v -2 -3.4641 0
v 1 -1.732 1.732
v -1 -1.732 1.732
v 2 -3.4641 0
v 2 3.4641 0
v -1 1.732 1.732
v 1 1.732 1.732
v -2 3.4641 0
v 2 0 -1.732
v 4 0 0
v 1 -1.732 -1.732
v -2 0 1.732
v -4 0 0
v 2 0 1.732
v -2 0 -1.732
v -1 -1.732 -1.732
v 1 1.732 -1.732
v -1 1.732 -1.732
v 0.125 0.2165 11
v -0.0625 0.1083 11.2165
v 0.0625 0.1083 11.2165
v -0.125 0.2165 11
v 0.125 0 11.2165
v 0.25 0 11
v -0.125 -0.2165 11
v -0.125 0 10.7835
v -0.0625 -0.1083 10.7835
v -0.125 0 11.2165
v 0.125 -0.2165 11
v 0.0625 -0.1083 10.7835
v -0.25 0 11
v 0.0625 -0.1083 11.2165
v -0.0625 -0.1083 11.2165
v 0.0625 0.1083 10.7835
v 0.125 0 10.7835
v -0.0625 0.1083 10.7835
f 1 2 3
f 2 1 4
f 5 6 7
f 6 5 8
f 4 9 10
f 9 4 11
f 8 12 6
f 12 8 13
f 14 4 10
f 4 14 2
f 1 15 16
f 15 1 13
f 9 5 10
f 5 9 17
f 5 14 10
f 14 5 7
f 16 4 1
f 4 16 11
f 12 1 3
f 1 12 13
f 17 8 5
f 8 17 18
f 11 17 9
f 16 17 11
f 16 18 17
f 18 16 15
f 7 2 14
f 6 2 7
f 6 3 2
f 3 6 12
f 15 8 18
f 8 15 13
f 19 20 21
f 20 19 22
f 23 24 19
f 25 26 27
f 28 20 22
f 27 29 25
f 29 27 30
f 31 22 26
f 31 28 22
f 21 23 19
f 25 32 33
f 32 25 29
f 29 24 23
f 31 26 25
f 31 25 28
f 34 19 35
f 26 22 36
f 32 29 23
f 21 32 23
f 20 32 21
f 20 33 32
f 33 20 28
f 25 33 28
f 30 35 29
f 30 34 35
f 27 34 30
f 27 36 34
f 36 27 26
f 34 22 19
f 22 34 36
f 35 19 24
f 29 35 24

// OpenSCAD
mirror([1,0,0]) scale([2,2,2]) stamp_base(base_thick = 1.5);
mirror([1,0,0]) scale([2,2,2]) stamp_text(base_thick = 3);
mirror([1,0,0]) scale([2,2,2]) stamp_border(base_thick = 3);
mirror([1,0,0]) scale([2,2,2]) stamp_bulb(base_thick = 3);
!mirror([1,0,0]) scale([2,2,2]) stamp_all(base_thick = 3);

//DXFs for lasercutting
projection() mirror([1,0,0]) scale([2,2,2]) stamp_base(base_thick = 1.5);
projection(cut=true) mirror([1,0,0]) scale([2,2,2]) translate([0,0,-8]) stamp_all(base_thick = 3);

scale([1.5,1.5,1]) logo();

sc = .1;

stamp_base_thick = 6;
base_thick = 1.5;
gear_thick = 2;
thread_thick = 2.5;
inner_thick = 2;

module stamp_base(){
    sphere_rad = 1;
    minkowski(){
        translate([0,0,stamp_base_thick-base_thick+sphere_rad/2-.25]) hull() linear_extrude(height=base_thick-sphere_rad){
            scale([sc,sc,sc]) import("nova-labs-stamp.dxf", layer="border");
            scale([sc,sc,sc]) import("nova-labs-stamp.dxf", layer="bulb");
        }
        
        //cylinder(r1=1, r2=.5, h=base_thick/2, $fn=12);
        scale([2,2,1]) sphere(r=sphere_rad/2, $fn=6);
    }
    
    hull() {
        minkowski(){
            translate([0,0,stamp_base_thick-base_thick+sphere_rad/2-.25]) hull() linear_extrude(height=base_thick-sphere_rad){
                scale([sc,sc,sc]) import("nova-labs-stamp.dxf", layer="border");
                scale([sc,sc,sc]) import("nova-labs-stamp.dxf", layer="bulb");
            }
        
            //cylinder(r1=1, r2=.5, h=base_thick/2, $fn=12);
            scale([2,2,1]) sphere(r=sphere_rad/2, $fn=6);
        }
        
        minkowski(){
            translate([2.25,3,0]) scale([.75,.75,1]) translate([0,0,sphere_rad/2-.25]) hull() linear_extrude(height=base_thick-sphere_rad){
                scale([sc,sc,sc]) import("nova-labs-stamp.dxf", layer="border");
                scale([sc,sc,sc]) import("nova-labs-stamp.dxf", layer="bulb");
            }
        }
    }
    
    minkowski(){
        translate([2.25,3,0]) scale([.75,.75,1]) translate([0,0,sphere_rad/2-.25]) hull() linear_extrude(height=base_thick-sphere_rad){
            scale([sc,sc,sc]) import("nova-labs-stamp.dxf", layer="border");
            scale([sc,sc,sc]) import("nova-labs-stamp.dxf", layer="bulb");
        }
        scale([2,2,1]) sphere(r=sphere_rad, $fn=6);
    }
}

module stamp_all(){
    sphere_rad = .25;
    stamp_base();
    translate([0,0,stamp_base_thick-.5]) minkowski(){
        linear_extrude(height=base_thick-sphere_rad){
            scale([sc,sc,sc]) import("nova-labs-stamp.dxf", layer="border");
        }
        
        scale([1,1,1]) sphere(r=sphere_rad/2, $fn=6);
    }
    
    translate([0,0,stamp_base_thick-.5]) minkowski(){
        linear_extrude(height=base_thick-sphere_rad){
            scale([sc,sc,sc]) import("nova-labs-stamp.dxf", layer="text");
        }
        
        scale([1,1,1]) sphere(r=sphere_rad/2, $fn=6);
    }
    
    translate([0,0,stamp_base_thick-.5]) minkowski(){
        linear_extrude(height=base_thick-sphere_rad){
            scale([sc,sc,sc]) import("nova-labs-stamp.dxf", layer="bulb");
        }
        
        scale([1,1,1]) sphere(r=sphere_rad/2, $fn=6);
    }
}

module stamp_border(){
    sphere_rad = .333;
    stamp_base();
    translate([0,0,stamp_base_thick-.5]) minkowski(){
        linear_extrude(height=base_thick-sphere_rad){
            scale([sc,sc,sc]) import("nova-labs-stamp.dxf", layer="border");
        }
        
        scale([1,1,1]) sphere(r=sphere_rad/2, $fn=6);
    }
}

module stamp_text(){
    sphere_rad = .25;
    stamp_base();
    translate([0,0,stamp_base_thick-.5]) minkowski(){
        linear_extrude(height=base_thick-sphere_rad){
            scale([sc,sc,sc]) import("nova-labs-stamp.dxf", layer="text");
        }
        
        scale([1,1,1]) sphere(r=sphere_rad/2, $fn=6);
    }
}

module stamp_bulb(){
    sphere_rad = .25;
    stamp_base();
    translate([0,0,stamp_base_thick-.5]) minkowski(){
        linear_extrude(height=base_thick-sphere_rad){
            scale([sc,sc,sc]) import("nova-labs-stamp.dxf", layer="bulb");
        }
        
        scale([1,1,1]) sphere(r=sphere_rad/2, $fn=6);
    }
}

module logo(){
    union(){
        base();
        
        inner();
        threads();
        gear();
    }
}

module base(){
    sphere_rad = 1;
    minkowski(){
        linear_extrude(height=base_thick-sphere_rad){
            scale([sc,sc,sc]) import("nova-labs_icon.dxf");
        }
        //cylinder(r1=1, r2=.5, h=base_thick/2, $fn=12);
        scale([2,2,1]) sphere(r=sphere_rad/2, $fn=6);
    }
}

module gear(){
    minkowski(){
        linear_extrude(height=gear_thick*8/9){
            scale([sc,sc,sc]) import("nova-labs_icon.dxf", layer="gear");
        }
        cylinder(r1=.25, r2=.125, h=gear_thick*1/9, $fn=12);
    }
}

module threads(){
    intersection(){
        linear_extrude(height=thread_thick){
            scale([sc,sc,sc]) import("nova-labs_icon.dxf", layer="threads");
        }
        
        translate([-1,0,0]) rotate([0,0,-27]) scale([.9,.9,.75]) rotate([90,0,0]) cylinder(r=3, h=31, center=true, $fn=60);
    }
}

module inner(){
    minkowski(){
        linear_extrude(height=inner_thick*9/10){
            scale([sc,sc,sc]) import("nova-labs_icon.dxf", layer="inner");
        }
        cylinder(r1=.125, r2=.125/2, h=inner_thick*1/10, $fn=12);
    }
}
